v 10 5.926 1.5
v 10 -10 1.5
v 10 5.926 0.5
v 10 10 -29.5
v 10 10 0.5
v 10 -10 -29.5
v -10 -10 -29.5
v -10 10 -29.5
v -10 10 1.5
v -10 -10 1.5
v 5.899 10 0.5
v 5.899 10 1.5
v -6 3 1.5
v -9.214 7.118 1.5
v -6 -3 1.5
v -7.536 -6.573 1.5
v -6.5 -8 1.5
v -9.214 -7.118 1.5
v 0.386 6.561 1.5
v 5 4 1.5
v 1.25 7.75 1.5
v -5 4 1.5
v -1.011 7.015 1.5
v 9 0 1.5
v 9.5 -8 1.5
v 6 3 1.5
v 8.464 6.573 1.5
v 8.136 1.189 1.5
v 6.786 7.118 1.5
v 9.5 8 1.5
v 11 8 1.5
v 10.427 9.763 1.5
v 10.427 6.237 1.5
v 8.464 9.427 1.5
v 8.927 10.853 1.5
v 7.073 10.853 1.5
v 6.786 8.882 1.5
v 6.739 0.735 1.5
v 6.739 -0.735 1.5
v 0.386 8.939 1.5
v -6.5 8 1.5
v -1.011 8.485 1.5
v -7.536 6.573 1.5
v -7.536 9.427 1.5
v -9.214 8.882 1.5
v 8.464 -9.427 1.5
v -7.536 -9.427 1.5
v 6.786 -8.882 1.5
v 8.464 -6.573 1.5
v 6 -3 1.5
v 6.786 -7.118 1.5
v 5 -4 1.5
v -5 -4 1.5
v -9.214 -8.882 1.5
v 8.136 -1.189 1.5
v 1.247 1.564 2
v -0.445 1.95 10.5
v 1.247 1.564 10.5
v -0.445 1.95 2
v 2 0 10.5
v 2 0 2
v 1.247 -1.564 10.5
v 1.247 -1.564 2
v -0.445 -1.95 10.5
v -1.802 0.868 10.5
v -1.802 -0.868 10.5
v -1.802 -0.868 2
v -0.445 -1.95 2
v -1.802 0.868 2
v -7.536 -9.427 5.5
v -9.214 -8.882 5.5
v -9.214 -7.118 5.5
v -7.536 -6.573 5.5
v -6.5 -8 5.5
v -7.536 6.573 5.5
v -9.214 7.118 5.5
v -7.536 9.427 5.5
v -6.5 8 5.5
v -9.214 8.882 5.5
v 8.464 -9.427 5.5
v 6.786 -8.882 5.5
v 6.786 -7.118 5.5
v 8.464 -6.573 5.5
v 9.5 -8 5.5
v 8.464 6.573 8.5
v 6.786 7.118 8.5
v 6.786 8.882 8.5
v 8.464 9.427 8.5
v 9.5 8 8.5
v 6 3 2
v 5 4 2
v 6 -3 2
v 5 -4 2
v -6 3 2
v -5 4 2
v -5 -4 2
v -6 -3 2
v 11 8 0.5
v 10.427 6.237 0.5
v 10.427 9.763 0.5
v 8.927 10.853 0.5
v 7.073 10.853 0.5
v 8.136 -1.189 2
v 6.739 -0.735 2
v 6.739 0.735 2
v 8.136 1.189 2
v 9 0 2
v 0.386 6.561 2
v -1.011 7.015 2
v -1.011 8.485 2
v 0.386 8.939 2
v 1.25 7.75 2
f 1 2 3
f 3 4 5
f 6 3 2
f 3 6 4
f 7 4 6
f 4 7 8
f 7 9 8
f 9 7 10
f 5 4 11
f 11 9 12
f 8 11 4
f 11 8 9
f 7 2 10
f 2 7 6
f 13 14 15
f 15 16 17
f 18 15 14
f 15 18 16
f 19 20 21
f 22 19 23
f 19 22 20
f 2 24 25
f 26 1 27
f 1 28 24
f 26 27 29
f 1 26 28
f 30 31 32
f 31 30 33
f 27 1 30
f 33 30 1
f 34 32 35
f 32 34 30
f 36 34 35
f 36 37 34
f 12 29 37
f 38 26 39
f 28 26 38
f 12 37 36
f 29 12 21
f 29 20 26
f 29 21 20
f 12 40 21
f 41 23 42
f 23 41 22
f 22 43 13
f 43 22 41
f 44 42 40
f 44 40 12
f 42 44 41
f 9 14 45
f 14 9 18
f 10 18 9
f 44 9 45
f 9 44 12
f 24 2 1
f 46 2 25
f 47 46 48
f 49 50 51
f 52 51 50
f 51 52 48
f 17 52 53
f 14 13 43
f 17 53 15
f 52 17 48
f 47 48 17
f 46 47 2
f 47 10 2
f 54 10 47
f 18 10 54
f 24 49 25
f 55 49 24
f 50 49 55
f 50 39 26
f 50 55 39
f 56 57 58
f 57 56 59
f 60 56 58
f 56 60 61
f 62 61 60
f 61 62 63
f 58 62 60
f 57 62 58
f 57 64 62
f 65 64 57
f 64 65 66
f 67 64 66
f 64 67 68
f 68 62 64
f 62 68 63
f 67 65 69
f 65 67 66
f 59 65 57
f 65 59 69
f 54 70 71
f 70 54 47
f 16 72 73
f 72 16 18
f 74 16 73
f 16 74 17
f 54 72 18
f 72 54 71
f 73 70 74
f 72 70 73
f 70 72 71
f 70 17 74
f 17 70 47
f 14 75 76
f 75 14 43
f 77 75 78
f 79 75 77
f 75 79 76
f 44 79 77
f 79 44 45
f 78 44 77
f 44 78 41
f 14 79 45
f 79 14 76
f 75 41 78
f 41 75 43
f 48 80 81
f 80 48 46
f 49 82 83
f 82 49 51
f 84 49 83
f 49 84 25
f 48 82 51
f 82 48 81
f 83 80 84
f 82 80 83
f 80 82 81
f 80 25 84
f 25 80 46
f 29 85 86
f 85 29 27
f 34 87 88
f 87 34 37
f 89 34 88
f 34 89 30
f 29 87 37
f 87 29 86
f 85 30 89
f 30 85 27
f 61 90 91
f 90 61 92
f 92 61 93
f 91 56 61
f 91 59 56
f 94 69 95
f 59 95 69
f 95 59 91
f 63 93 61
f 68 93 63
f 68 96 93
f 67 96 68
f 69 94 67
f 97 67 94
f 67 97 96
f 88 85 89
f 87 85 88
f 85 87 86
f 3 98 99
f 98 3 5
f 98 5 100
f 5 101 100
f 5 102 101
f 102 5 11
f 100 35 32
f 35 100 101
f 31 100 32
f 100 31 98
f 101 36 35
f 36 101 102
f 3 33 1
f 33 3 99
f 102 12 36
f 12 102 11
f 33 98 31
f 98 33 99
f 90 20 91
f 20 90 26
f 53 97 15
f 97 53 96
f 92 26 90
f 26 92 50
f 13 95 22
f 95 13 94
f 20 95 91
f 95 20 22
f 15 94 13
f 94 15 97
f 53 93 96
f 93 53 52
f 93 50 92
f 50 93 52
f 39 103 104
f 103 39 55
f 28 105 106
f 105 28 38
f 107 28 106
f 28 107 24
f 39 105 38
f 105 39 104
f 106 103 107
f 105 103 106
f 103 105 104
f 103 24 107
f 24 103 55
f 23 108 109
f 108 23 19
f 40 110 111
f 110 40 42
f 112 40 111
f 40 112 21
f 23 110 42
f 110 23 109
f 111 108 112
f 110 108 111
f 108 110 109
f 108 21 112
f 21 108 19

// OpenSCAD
// Parameters
face_width_mm = 20; //[10:40:1]
body_length_mm = 30; //[15:60:1]
body_back_extension_mm = 2; //[1:6:1]
shaft_diameter_mm = 4; //[2:10:0.5]
shaft_length_mm = 10; //[5:30:1]
front_face_thickness_mm = 3; //[1.5:8:0.5]
corner_radius_mm = 1.5; //[0:5:0.5]
mounting_hole_spacing_mm = 16; //[8:32:1]
mounting_hole_diameter_mm = 3; //[1.5:6:0.5]
mounting_hole_depth_mm = 6; //[3:15:1]
eps_overlap_mm = 1; //[0.5:2:0.5]
d_plug_length_mm = 10; //[5:25:1]
d_plug_width_mm = 6; //[3:15:1]
d_plug_rad_mm = 1; //[0.5:4:0.5]
grill_width_mm = 12; //[6:30:1]
grill_height_mm = 12; //[6:30:1]
grill_hole_diameter_mm = 2; //[1:5:0.5]
grill_hole_depth_mm = 2; //[1:6:1]
screw_shank_diameter_mm = 3; //[2:6:0.5]
screw_length_mm = 8; //[4:25:1]
washer_outer_diameter_mm = 6; //[4:14:0.5]
washer_thickness_mm = 1; //[0.5:3:0.5]
ttrack_hole_diameter_mm = 2.5; //[1.5:6:0.5]
rail_hole_diameter_mm = 2.5; //[1.5:6:0.5]

// D Plug D - Custom component
module d_plug_D() {
  color("Silver") {
    linear_extrude(height=front_face_thickness_mm) {
      offset(r=d_plug_rad_mm) {
        polygon(points=[
          [-d_plug_length_mm/2, -d_plug_width_mm/2],
          [d_plug_length_mm/2, -d_plug_width_mm/2],
          [d_plug_length_mm/2, d_plug_width_mm/2],
          [-d_plug_length_mm/2, d_plug_width_mm/2]
        ]);
      }
    }
  }
}

// Grill Hole Positions - Custom component
module grill_hole_positions() {
  color("DimGray") {
    for (x = [-grill_width_mm/4, grill_width_mm/4])
      for (y = [-grill_height_mm/4, grill_height_mm/4])
        translate([x, y, front_face_thickness_mm/2 - grill_hole_depth_mm/2])
          cylinder(r=grill_hole_diameter_mm/2, h=grill_hole_depth_mm + eps_overlap_mm, center=true);
  }
}

// Screw And Washer - Custom component
module screw_and_washer() {
  color("Black") {
    translate([mounting_hole_spacing_mm/2, mounting_hole_spacing_mm/2, front_face_thickness_mm/2 + screw_length_mm/2 - eps_overlap_mm])
      cylinder(r=screw_shank_diameter_mm/2, h=screw_length_mm, center=true);
    translate([mounting_hole_spacing_mm/2, mounting_hole_spacing_mm/2, front_face_thickness_mm/2 + washer_thickness_mm/2 - eps_overlap_mm])
      cylinder(r=washer_outer_diameter_mm/2, h=washer_thickness_mm, center=true);
  }
}

// Ttrack Hole Positions - Custom component
module ttrack_hole_positions() {
  color("DimGray") {
    translate([face_width_mm/2 - ttrack_hole_diameter_mm/2 - eps_overlap_mm, 0, 0])
      cylinder(r=ttrack_hole_diameter_mm/2, h=front_face_thickness_mm + eps_overlap_mm, center=true);
  }
}

// Rail Hole Positions - Custom component
module rail_hole_positions() {
  color("DimGray") {
    translate([0, face_width_mm/2 - rail_hole_diameter_mm/2 - eps_overlap_mm, 0])
      cylinder(r=rail_hole_diameter_mm/2, h=front_face_thickness_mm + eps_overlap_mm, center=true);
  }
}

// Motor Assembly
module assembly() {
  color("Black") {
    // Motor Body
    translate([0, 0, -front_face_thickness_mm/2 - body_length_mm/2 + body_back_extension_mm])
      cube([face_width_mm, face_width_mm, body_length_mm], center=true);
    // Front Face
    translate([0, 0, 0])
      cube([face_width_mm, face_width_mm, front_face_thickness_mm], center=true);
    // Shaft
    translate([0, 0, front_face_thickness_mm/2 + shaft_length_mm/2 - eps_overlap_mm])
      cylinder(r=shaft_diameter_mm/2, h=shaft_length_mm, center=true);
  }
  // Mounting Holes
  color("Silver") {
    for (x = [-mounting_hole_spacing_mm/2, mounting_hole_spacing_mm/2])
      for (y = [-mounting_hole_spacing_mm/2, mounting_hole_spacing_mm/2])
        translate([x, y, mounting_hole_depth_mm/2 - eps_overlap_mm])
          cylinder(r=mounting_hole_diameter_mm/2, h=mounting_hole_depth_mm + eps_overlap_mm, center=true);
  }
  // D Plug D
  translate([0, 0, -front_face_thickness_mm/2 + front_face_thickness_mm/2 - eps_overlap_mm])
    d_plug_D();
  // Grill Hole Positions
  grill_hole_positions();
  // Screw And Washer
  screw_and_washer();
  // Ttrack Hole Positions
  ttrack_hole_positions();
  // Rail Hole Positions
  rail_hole_positions();
}

assembly();
